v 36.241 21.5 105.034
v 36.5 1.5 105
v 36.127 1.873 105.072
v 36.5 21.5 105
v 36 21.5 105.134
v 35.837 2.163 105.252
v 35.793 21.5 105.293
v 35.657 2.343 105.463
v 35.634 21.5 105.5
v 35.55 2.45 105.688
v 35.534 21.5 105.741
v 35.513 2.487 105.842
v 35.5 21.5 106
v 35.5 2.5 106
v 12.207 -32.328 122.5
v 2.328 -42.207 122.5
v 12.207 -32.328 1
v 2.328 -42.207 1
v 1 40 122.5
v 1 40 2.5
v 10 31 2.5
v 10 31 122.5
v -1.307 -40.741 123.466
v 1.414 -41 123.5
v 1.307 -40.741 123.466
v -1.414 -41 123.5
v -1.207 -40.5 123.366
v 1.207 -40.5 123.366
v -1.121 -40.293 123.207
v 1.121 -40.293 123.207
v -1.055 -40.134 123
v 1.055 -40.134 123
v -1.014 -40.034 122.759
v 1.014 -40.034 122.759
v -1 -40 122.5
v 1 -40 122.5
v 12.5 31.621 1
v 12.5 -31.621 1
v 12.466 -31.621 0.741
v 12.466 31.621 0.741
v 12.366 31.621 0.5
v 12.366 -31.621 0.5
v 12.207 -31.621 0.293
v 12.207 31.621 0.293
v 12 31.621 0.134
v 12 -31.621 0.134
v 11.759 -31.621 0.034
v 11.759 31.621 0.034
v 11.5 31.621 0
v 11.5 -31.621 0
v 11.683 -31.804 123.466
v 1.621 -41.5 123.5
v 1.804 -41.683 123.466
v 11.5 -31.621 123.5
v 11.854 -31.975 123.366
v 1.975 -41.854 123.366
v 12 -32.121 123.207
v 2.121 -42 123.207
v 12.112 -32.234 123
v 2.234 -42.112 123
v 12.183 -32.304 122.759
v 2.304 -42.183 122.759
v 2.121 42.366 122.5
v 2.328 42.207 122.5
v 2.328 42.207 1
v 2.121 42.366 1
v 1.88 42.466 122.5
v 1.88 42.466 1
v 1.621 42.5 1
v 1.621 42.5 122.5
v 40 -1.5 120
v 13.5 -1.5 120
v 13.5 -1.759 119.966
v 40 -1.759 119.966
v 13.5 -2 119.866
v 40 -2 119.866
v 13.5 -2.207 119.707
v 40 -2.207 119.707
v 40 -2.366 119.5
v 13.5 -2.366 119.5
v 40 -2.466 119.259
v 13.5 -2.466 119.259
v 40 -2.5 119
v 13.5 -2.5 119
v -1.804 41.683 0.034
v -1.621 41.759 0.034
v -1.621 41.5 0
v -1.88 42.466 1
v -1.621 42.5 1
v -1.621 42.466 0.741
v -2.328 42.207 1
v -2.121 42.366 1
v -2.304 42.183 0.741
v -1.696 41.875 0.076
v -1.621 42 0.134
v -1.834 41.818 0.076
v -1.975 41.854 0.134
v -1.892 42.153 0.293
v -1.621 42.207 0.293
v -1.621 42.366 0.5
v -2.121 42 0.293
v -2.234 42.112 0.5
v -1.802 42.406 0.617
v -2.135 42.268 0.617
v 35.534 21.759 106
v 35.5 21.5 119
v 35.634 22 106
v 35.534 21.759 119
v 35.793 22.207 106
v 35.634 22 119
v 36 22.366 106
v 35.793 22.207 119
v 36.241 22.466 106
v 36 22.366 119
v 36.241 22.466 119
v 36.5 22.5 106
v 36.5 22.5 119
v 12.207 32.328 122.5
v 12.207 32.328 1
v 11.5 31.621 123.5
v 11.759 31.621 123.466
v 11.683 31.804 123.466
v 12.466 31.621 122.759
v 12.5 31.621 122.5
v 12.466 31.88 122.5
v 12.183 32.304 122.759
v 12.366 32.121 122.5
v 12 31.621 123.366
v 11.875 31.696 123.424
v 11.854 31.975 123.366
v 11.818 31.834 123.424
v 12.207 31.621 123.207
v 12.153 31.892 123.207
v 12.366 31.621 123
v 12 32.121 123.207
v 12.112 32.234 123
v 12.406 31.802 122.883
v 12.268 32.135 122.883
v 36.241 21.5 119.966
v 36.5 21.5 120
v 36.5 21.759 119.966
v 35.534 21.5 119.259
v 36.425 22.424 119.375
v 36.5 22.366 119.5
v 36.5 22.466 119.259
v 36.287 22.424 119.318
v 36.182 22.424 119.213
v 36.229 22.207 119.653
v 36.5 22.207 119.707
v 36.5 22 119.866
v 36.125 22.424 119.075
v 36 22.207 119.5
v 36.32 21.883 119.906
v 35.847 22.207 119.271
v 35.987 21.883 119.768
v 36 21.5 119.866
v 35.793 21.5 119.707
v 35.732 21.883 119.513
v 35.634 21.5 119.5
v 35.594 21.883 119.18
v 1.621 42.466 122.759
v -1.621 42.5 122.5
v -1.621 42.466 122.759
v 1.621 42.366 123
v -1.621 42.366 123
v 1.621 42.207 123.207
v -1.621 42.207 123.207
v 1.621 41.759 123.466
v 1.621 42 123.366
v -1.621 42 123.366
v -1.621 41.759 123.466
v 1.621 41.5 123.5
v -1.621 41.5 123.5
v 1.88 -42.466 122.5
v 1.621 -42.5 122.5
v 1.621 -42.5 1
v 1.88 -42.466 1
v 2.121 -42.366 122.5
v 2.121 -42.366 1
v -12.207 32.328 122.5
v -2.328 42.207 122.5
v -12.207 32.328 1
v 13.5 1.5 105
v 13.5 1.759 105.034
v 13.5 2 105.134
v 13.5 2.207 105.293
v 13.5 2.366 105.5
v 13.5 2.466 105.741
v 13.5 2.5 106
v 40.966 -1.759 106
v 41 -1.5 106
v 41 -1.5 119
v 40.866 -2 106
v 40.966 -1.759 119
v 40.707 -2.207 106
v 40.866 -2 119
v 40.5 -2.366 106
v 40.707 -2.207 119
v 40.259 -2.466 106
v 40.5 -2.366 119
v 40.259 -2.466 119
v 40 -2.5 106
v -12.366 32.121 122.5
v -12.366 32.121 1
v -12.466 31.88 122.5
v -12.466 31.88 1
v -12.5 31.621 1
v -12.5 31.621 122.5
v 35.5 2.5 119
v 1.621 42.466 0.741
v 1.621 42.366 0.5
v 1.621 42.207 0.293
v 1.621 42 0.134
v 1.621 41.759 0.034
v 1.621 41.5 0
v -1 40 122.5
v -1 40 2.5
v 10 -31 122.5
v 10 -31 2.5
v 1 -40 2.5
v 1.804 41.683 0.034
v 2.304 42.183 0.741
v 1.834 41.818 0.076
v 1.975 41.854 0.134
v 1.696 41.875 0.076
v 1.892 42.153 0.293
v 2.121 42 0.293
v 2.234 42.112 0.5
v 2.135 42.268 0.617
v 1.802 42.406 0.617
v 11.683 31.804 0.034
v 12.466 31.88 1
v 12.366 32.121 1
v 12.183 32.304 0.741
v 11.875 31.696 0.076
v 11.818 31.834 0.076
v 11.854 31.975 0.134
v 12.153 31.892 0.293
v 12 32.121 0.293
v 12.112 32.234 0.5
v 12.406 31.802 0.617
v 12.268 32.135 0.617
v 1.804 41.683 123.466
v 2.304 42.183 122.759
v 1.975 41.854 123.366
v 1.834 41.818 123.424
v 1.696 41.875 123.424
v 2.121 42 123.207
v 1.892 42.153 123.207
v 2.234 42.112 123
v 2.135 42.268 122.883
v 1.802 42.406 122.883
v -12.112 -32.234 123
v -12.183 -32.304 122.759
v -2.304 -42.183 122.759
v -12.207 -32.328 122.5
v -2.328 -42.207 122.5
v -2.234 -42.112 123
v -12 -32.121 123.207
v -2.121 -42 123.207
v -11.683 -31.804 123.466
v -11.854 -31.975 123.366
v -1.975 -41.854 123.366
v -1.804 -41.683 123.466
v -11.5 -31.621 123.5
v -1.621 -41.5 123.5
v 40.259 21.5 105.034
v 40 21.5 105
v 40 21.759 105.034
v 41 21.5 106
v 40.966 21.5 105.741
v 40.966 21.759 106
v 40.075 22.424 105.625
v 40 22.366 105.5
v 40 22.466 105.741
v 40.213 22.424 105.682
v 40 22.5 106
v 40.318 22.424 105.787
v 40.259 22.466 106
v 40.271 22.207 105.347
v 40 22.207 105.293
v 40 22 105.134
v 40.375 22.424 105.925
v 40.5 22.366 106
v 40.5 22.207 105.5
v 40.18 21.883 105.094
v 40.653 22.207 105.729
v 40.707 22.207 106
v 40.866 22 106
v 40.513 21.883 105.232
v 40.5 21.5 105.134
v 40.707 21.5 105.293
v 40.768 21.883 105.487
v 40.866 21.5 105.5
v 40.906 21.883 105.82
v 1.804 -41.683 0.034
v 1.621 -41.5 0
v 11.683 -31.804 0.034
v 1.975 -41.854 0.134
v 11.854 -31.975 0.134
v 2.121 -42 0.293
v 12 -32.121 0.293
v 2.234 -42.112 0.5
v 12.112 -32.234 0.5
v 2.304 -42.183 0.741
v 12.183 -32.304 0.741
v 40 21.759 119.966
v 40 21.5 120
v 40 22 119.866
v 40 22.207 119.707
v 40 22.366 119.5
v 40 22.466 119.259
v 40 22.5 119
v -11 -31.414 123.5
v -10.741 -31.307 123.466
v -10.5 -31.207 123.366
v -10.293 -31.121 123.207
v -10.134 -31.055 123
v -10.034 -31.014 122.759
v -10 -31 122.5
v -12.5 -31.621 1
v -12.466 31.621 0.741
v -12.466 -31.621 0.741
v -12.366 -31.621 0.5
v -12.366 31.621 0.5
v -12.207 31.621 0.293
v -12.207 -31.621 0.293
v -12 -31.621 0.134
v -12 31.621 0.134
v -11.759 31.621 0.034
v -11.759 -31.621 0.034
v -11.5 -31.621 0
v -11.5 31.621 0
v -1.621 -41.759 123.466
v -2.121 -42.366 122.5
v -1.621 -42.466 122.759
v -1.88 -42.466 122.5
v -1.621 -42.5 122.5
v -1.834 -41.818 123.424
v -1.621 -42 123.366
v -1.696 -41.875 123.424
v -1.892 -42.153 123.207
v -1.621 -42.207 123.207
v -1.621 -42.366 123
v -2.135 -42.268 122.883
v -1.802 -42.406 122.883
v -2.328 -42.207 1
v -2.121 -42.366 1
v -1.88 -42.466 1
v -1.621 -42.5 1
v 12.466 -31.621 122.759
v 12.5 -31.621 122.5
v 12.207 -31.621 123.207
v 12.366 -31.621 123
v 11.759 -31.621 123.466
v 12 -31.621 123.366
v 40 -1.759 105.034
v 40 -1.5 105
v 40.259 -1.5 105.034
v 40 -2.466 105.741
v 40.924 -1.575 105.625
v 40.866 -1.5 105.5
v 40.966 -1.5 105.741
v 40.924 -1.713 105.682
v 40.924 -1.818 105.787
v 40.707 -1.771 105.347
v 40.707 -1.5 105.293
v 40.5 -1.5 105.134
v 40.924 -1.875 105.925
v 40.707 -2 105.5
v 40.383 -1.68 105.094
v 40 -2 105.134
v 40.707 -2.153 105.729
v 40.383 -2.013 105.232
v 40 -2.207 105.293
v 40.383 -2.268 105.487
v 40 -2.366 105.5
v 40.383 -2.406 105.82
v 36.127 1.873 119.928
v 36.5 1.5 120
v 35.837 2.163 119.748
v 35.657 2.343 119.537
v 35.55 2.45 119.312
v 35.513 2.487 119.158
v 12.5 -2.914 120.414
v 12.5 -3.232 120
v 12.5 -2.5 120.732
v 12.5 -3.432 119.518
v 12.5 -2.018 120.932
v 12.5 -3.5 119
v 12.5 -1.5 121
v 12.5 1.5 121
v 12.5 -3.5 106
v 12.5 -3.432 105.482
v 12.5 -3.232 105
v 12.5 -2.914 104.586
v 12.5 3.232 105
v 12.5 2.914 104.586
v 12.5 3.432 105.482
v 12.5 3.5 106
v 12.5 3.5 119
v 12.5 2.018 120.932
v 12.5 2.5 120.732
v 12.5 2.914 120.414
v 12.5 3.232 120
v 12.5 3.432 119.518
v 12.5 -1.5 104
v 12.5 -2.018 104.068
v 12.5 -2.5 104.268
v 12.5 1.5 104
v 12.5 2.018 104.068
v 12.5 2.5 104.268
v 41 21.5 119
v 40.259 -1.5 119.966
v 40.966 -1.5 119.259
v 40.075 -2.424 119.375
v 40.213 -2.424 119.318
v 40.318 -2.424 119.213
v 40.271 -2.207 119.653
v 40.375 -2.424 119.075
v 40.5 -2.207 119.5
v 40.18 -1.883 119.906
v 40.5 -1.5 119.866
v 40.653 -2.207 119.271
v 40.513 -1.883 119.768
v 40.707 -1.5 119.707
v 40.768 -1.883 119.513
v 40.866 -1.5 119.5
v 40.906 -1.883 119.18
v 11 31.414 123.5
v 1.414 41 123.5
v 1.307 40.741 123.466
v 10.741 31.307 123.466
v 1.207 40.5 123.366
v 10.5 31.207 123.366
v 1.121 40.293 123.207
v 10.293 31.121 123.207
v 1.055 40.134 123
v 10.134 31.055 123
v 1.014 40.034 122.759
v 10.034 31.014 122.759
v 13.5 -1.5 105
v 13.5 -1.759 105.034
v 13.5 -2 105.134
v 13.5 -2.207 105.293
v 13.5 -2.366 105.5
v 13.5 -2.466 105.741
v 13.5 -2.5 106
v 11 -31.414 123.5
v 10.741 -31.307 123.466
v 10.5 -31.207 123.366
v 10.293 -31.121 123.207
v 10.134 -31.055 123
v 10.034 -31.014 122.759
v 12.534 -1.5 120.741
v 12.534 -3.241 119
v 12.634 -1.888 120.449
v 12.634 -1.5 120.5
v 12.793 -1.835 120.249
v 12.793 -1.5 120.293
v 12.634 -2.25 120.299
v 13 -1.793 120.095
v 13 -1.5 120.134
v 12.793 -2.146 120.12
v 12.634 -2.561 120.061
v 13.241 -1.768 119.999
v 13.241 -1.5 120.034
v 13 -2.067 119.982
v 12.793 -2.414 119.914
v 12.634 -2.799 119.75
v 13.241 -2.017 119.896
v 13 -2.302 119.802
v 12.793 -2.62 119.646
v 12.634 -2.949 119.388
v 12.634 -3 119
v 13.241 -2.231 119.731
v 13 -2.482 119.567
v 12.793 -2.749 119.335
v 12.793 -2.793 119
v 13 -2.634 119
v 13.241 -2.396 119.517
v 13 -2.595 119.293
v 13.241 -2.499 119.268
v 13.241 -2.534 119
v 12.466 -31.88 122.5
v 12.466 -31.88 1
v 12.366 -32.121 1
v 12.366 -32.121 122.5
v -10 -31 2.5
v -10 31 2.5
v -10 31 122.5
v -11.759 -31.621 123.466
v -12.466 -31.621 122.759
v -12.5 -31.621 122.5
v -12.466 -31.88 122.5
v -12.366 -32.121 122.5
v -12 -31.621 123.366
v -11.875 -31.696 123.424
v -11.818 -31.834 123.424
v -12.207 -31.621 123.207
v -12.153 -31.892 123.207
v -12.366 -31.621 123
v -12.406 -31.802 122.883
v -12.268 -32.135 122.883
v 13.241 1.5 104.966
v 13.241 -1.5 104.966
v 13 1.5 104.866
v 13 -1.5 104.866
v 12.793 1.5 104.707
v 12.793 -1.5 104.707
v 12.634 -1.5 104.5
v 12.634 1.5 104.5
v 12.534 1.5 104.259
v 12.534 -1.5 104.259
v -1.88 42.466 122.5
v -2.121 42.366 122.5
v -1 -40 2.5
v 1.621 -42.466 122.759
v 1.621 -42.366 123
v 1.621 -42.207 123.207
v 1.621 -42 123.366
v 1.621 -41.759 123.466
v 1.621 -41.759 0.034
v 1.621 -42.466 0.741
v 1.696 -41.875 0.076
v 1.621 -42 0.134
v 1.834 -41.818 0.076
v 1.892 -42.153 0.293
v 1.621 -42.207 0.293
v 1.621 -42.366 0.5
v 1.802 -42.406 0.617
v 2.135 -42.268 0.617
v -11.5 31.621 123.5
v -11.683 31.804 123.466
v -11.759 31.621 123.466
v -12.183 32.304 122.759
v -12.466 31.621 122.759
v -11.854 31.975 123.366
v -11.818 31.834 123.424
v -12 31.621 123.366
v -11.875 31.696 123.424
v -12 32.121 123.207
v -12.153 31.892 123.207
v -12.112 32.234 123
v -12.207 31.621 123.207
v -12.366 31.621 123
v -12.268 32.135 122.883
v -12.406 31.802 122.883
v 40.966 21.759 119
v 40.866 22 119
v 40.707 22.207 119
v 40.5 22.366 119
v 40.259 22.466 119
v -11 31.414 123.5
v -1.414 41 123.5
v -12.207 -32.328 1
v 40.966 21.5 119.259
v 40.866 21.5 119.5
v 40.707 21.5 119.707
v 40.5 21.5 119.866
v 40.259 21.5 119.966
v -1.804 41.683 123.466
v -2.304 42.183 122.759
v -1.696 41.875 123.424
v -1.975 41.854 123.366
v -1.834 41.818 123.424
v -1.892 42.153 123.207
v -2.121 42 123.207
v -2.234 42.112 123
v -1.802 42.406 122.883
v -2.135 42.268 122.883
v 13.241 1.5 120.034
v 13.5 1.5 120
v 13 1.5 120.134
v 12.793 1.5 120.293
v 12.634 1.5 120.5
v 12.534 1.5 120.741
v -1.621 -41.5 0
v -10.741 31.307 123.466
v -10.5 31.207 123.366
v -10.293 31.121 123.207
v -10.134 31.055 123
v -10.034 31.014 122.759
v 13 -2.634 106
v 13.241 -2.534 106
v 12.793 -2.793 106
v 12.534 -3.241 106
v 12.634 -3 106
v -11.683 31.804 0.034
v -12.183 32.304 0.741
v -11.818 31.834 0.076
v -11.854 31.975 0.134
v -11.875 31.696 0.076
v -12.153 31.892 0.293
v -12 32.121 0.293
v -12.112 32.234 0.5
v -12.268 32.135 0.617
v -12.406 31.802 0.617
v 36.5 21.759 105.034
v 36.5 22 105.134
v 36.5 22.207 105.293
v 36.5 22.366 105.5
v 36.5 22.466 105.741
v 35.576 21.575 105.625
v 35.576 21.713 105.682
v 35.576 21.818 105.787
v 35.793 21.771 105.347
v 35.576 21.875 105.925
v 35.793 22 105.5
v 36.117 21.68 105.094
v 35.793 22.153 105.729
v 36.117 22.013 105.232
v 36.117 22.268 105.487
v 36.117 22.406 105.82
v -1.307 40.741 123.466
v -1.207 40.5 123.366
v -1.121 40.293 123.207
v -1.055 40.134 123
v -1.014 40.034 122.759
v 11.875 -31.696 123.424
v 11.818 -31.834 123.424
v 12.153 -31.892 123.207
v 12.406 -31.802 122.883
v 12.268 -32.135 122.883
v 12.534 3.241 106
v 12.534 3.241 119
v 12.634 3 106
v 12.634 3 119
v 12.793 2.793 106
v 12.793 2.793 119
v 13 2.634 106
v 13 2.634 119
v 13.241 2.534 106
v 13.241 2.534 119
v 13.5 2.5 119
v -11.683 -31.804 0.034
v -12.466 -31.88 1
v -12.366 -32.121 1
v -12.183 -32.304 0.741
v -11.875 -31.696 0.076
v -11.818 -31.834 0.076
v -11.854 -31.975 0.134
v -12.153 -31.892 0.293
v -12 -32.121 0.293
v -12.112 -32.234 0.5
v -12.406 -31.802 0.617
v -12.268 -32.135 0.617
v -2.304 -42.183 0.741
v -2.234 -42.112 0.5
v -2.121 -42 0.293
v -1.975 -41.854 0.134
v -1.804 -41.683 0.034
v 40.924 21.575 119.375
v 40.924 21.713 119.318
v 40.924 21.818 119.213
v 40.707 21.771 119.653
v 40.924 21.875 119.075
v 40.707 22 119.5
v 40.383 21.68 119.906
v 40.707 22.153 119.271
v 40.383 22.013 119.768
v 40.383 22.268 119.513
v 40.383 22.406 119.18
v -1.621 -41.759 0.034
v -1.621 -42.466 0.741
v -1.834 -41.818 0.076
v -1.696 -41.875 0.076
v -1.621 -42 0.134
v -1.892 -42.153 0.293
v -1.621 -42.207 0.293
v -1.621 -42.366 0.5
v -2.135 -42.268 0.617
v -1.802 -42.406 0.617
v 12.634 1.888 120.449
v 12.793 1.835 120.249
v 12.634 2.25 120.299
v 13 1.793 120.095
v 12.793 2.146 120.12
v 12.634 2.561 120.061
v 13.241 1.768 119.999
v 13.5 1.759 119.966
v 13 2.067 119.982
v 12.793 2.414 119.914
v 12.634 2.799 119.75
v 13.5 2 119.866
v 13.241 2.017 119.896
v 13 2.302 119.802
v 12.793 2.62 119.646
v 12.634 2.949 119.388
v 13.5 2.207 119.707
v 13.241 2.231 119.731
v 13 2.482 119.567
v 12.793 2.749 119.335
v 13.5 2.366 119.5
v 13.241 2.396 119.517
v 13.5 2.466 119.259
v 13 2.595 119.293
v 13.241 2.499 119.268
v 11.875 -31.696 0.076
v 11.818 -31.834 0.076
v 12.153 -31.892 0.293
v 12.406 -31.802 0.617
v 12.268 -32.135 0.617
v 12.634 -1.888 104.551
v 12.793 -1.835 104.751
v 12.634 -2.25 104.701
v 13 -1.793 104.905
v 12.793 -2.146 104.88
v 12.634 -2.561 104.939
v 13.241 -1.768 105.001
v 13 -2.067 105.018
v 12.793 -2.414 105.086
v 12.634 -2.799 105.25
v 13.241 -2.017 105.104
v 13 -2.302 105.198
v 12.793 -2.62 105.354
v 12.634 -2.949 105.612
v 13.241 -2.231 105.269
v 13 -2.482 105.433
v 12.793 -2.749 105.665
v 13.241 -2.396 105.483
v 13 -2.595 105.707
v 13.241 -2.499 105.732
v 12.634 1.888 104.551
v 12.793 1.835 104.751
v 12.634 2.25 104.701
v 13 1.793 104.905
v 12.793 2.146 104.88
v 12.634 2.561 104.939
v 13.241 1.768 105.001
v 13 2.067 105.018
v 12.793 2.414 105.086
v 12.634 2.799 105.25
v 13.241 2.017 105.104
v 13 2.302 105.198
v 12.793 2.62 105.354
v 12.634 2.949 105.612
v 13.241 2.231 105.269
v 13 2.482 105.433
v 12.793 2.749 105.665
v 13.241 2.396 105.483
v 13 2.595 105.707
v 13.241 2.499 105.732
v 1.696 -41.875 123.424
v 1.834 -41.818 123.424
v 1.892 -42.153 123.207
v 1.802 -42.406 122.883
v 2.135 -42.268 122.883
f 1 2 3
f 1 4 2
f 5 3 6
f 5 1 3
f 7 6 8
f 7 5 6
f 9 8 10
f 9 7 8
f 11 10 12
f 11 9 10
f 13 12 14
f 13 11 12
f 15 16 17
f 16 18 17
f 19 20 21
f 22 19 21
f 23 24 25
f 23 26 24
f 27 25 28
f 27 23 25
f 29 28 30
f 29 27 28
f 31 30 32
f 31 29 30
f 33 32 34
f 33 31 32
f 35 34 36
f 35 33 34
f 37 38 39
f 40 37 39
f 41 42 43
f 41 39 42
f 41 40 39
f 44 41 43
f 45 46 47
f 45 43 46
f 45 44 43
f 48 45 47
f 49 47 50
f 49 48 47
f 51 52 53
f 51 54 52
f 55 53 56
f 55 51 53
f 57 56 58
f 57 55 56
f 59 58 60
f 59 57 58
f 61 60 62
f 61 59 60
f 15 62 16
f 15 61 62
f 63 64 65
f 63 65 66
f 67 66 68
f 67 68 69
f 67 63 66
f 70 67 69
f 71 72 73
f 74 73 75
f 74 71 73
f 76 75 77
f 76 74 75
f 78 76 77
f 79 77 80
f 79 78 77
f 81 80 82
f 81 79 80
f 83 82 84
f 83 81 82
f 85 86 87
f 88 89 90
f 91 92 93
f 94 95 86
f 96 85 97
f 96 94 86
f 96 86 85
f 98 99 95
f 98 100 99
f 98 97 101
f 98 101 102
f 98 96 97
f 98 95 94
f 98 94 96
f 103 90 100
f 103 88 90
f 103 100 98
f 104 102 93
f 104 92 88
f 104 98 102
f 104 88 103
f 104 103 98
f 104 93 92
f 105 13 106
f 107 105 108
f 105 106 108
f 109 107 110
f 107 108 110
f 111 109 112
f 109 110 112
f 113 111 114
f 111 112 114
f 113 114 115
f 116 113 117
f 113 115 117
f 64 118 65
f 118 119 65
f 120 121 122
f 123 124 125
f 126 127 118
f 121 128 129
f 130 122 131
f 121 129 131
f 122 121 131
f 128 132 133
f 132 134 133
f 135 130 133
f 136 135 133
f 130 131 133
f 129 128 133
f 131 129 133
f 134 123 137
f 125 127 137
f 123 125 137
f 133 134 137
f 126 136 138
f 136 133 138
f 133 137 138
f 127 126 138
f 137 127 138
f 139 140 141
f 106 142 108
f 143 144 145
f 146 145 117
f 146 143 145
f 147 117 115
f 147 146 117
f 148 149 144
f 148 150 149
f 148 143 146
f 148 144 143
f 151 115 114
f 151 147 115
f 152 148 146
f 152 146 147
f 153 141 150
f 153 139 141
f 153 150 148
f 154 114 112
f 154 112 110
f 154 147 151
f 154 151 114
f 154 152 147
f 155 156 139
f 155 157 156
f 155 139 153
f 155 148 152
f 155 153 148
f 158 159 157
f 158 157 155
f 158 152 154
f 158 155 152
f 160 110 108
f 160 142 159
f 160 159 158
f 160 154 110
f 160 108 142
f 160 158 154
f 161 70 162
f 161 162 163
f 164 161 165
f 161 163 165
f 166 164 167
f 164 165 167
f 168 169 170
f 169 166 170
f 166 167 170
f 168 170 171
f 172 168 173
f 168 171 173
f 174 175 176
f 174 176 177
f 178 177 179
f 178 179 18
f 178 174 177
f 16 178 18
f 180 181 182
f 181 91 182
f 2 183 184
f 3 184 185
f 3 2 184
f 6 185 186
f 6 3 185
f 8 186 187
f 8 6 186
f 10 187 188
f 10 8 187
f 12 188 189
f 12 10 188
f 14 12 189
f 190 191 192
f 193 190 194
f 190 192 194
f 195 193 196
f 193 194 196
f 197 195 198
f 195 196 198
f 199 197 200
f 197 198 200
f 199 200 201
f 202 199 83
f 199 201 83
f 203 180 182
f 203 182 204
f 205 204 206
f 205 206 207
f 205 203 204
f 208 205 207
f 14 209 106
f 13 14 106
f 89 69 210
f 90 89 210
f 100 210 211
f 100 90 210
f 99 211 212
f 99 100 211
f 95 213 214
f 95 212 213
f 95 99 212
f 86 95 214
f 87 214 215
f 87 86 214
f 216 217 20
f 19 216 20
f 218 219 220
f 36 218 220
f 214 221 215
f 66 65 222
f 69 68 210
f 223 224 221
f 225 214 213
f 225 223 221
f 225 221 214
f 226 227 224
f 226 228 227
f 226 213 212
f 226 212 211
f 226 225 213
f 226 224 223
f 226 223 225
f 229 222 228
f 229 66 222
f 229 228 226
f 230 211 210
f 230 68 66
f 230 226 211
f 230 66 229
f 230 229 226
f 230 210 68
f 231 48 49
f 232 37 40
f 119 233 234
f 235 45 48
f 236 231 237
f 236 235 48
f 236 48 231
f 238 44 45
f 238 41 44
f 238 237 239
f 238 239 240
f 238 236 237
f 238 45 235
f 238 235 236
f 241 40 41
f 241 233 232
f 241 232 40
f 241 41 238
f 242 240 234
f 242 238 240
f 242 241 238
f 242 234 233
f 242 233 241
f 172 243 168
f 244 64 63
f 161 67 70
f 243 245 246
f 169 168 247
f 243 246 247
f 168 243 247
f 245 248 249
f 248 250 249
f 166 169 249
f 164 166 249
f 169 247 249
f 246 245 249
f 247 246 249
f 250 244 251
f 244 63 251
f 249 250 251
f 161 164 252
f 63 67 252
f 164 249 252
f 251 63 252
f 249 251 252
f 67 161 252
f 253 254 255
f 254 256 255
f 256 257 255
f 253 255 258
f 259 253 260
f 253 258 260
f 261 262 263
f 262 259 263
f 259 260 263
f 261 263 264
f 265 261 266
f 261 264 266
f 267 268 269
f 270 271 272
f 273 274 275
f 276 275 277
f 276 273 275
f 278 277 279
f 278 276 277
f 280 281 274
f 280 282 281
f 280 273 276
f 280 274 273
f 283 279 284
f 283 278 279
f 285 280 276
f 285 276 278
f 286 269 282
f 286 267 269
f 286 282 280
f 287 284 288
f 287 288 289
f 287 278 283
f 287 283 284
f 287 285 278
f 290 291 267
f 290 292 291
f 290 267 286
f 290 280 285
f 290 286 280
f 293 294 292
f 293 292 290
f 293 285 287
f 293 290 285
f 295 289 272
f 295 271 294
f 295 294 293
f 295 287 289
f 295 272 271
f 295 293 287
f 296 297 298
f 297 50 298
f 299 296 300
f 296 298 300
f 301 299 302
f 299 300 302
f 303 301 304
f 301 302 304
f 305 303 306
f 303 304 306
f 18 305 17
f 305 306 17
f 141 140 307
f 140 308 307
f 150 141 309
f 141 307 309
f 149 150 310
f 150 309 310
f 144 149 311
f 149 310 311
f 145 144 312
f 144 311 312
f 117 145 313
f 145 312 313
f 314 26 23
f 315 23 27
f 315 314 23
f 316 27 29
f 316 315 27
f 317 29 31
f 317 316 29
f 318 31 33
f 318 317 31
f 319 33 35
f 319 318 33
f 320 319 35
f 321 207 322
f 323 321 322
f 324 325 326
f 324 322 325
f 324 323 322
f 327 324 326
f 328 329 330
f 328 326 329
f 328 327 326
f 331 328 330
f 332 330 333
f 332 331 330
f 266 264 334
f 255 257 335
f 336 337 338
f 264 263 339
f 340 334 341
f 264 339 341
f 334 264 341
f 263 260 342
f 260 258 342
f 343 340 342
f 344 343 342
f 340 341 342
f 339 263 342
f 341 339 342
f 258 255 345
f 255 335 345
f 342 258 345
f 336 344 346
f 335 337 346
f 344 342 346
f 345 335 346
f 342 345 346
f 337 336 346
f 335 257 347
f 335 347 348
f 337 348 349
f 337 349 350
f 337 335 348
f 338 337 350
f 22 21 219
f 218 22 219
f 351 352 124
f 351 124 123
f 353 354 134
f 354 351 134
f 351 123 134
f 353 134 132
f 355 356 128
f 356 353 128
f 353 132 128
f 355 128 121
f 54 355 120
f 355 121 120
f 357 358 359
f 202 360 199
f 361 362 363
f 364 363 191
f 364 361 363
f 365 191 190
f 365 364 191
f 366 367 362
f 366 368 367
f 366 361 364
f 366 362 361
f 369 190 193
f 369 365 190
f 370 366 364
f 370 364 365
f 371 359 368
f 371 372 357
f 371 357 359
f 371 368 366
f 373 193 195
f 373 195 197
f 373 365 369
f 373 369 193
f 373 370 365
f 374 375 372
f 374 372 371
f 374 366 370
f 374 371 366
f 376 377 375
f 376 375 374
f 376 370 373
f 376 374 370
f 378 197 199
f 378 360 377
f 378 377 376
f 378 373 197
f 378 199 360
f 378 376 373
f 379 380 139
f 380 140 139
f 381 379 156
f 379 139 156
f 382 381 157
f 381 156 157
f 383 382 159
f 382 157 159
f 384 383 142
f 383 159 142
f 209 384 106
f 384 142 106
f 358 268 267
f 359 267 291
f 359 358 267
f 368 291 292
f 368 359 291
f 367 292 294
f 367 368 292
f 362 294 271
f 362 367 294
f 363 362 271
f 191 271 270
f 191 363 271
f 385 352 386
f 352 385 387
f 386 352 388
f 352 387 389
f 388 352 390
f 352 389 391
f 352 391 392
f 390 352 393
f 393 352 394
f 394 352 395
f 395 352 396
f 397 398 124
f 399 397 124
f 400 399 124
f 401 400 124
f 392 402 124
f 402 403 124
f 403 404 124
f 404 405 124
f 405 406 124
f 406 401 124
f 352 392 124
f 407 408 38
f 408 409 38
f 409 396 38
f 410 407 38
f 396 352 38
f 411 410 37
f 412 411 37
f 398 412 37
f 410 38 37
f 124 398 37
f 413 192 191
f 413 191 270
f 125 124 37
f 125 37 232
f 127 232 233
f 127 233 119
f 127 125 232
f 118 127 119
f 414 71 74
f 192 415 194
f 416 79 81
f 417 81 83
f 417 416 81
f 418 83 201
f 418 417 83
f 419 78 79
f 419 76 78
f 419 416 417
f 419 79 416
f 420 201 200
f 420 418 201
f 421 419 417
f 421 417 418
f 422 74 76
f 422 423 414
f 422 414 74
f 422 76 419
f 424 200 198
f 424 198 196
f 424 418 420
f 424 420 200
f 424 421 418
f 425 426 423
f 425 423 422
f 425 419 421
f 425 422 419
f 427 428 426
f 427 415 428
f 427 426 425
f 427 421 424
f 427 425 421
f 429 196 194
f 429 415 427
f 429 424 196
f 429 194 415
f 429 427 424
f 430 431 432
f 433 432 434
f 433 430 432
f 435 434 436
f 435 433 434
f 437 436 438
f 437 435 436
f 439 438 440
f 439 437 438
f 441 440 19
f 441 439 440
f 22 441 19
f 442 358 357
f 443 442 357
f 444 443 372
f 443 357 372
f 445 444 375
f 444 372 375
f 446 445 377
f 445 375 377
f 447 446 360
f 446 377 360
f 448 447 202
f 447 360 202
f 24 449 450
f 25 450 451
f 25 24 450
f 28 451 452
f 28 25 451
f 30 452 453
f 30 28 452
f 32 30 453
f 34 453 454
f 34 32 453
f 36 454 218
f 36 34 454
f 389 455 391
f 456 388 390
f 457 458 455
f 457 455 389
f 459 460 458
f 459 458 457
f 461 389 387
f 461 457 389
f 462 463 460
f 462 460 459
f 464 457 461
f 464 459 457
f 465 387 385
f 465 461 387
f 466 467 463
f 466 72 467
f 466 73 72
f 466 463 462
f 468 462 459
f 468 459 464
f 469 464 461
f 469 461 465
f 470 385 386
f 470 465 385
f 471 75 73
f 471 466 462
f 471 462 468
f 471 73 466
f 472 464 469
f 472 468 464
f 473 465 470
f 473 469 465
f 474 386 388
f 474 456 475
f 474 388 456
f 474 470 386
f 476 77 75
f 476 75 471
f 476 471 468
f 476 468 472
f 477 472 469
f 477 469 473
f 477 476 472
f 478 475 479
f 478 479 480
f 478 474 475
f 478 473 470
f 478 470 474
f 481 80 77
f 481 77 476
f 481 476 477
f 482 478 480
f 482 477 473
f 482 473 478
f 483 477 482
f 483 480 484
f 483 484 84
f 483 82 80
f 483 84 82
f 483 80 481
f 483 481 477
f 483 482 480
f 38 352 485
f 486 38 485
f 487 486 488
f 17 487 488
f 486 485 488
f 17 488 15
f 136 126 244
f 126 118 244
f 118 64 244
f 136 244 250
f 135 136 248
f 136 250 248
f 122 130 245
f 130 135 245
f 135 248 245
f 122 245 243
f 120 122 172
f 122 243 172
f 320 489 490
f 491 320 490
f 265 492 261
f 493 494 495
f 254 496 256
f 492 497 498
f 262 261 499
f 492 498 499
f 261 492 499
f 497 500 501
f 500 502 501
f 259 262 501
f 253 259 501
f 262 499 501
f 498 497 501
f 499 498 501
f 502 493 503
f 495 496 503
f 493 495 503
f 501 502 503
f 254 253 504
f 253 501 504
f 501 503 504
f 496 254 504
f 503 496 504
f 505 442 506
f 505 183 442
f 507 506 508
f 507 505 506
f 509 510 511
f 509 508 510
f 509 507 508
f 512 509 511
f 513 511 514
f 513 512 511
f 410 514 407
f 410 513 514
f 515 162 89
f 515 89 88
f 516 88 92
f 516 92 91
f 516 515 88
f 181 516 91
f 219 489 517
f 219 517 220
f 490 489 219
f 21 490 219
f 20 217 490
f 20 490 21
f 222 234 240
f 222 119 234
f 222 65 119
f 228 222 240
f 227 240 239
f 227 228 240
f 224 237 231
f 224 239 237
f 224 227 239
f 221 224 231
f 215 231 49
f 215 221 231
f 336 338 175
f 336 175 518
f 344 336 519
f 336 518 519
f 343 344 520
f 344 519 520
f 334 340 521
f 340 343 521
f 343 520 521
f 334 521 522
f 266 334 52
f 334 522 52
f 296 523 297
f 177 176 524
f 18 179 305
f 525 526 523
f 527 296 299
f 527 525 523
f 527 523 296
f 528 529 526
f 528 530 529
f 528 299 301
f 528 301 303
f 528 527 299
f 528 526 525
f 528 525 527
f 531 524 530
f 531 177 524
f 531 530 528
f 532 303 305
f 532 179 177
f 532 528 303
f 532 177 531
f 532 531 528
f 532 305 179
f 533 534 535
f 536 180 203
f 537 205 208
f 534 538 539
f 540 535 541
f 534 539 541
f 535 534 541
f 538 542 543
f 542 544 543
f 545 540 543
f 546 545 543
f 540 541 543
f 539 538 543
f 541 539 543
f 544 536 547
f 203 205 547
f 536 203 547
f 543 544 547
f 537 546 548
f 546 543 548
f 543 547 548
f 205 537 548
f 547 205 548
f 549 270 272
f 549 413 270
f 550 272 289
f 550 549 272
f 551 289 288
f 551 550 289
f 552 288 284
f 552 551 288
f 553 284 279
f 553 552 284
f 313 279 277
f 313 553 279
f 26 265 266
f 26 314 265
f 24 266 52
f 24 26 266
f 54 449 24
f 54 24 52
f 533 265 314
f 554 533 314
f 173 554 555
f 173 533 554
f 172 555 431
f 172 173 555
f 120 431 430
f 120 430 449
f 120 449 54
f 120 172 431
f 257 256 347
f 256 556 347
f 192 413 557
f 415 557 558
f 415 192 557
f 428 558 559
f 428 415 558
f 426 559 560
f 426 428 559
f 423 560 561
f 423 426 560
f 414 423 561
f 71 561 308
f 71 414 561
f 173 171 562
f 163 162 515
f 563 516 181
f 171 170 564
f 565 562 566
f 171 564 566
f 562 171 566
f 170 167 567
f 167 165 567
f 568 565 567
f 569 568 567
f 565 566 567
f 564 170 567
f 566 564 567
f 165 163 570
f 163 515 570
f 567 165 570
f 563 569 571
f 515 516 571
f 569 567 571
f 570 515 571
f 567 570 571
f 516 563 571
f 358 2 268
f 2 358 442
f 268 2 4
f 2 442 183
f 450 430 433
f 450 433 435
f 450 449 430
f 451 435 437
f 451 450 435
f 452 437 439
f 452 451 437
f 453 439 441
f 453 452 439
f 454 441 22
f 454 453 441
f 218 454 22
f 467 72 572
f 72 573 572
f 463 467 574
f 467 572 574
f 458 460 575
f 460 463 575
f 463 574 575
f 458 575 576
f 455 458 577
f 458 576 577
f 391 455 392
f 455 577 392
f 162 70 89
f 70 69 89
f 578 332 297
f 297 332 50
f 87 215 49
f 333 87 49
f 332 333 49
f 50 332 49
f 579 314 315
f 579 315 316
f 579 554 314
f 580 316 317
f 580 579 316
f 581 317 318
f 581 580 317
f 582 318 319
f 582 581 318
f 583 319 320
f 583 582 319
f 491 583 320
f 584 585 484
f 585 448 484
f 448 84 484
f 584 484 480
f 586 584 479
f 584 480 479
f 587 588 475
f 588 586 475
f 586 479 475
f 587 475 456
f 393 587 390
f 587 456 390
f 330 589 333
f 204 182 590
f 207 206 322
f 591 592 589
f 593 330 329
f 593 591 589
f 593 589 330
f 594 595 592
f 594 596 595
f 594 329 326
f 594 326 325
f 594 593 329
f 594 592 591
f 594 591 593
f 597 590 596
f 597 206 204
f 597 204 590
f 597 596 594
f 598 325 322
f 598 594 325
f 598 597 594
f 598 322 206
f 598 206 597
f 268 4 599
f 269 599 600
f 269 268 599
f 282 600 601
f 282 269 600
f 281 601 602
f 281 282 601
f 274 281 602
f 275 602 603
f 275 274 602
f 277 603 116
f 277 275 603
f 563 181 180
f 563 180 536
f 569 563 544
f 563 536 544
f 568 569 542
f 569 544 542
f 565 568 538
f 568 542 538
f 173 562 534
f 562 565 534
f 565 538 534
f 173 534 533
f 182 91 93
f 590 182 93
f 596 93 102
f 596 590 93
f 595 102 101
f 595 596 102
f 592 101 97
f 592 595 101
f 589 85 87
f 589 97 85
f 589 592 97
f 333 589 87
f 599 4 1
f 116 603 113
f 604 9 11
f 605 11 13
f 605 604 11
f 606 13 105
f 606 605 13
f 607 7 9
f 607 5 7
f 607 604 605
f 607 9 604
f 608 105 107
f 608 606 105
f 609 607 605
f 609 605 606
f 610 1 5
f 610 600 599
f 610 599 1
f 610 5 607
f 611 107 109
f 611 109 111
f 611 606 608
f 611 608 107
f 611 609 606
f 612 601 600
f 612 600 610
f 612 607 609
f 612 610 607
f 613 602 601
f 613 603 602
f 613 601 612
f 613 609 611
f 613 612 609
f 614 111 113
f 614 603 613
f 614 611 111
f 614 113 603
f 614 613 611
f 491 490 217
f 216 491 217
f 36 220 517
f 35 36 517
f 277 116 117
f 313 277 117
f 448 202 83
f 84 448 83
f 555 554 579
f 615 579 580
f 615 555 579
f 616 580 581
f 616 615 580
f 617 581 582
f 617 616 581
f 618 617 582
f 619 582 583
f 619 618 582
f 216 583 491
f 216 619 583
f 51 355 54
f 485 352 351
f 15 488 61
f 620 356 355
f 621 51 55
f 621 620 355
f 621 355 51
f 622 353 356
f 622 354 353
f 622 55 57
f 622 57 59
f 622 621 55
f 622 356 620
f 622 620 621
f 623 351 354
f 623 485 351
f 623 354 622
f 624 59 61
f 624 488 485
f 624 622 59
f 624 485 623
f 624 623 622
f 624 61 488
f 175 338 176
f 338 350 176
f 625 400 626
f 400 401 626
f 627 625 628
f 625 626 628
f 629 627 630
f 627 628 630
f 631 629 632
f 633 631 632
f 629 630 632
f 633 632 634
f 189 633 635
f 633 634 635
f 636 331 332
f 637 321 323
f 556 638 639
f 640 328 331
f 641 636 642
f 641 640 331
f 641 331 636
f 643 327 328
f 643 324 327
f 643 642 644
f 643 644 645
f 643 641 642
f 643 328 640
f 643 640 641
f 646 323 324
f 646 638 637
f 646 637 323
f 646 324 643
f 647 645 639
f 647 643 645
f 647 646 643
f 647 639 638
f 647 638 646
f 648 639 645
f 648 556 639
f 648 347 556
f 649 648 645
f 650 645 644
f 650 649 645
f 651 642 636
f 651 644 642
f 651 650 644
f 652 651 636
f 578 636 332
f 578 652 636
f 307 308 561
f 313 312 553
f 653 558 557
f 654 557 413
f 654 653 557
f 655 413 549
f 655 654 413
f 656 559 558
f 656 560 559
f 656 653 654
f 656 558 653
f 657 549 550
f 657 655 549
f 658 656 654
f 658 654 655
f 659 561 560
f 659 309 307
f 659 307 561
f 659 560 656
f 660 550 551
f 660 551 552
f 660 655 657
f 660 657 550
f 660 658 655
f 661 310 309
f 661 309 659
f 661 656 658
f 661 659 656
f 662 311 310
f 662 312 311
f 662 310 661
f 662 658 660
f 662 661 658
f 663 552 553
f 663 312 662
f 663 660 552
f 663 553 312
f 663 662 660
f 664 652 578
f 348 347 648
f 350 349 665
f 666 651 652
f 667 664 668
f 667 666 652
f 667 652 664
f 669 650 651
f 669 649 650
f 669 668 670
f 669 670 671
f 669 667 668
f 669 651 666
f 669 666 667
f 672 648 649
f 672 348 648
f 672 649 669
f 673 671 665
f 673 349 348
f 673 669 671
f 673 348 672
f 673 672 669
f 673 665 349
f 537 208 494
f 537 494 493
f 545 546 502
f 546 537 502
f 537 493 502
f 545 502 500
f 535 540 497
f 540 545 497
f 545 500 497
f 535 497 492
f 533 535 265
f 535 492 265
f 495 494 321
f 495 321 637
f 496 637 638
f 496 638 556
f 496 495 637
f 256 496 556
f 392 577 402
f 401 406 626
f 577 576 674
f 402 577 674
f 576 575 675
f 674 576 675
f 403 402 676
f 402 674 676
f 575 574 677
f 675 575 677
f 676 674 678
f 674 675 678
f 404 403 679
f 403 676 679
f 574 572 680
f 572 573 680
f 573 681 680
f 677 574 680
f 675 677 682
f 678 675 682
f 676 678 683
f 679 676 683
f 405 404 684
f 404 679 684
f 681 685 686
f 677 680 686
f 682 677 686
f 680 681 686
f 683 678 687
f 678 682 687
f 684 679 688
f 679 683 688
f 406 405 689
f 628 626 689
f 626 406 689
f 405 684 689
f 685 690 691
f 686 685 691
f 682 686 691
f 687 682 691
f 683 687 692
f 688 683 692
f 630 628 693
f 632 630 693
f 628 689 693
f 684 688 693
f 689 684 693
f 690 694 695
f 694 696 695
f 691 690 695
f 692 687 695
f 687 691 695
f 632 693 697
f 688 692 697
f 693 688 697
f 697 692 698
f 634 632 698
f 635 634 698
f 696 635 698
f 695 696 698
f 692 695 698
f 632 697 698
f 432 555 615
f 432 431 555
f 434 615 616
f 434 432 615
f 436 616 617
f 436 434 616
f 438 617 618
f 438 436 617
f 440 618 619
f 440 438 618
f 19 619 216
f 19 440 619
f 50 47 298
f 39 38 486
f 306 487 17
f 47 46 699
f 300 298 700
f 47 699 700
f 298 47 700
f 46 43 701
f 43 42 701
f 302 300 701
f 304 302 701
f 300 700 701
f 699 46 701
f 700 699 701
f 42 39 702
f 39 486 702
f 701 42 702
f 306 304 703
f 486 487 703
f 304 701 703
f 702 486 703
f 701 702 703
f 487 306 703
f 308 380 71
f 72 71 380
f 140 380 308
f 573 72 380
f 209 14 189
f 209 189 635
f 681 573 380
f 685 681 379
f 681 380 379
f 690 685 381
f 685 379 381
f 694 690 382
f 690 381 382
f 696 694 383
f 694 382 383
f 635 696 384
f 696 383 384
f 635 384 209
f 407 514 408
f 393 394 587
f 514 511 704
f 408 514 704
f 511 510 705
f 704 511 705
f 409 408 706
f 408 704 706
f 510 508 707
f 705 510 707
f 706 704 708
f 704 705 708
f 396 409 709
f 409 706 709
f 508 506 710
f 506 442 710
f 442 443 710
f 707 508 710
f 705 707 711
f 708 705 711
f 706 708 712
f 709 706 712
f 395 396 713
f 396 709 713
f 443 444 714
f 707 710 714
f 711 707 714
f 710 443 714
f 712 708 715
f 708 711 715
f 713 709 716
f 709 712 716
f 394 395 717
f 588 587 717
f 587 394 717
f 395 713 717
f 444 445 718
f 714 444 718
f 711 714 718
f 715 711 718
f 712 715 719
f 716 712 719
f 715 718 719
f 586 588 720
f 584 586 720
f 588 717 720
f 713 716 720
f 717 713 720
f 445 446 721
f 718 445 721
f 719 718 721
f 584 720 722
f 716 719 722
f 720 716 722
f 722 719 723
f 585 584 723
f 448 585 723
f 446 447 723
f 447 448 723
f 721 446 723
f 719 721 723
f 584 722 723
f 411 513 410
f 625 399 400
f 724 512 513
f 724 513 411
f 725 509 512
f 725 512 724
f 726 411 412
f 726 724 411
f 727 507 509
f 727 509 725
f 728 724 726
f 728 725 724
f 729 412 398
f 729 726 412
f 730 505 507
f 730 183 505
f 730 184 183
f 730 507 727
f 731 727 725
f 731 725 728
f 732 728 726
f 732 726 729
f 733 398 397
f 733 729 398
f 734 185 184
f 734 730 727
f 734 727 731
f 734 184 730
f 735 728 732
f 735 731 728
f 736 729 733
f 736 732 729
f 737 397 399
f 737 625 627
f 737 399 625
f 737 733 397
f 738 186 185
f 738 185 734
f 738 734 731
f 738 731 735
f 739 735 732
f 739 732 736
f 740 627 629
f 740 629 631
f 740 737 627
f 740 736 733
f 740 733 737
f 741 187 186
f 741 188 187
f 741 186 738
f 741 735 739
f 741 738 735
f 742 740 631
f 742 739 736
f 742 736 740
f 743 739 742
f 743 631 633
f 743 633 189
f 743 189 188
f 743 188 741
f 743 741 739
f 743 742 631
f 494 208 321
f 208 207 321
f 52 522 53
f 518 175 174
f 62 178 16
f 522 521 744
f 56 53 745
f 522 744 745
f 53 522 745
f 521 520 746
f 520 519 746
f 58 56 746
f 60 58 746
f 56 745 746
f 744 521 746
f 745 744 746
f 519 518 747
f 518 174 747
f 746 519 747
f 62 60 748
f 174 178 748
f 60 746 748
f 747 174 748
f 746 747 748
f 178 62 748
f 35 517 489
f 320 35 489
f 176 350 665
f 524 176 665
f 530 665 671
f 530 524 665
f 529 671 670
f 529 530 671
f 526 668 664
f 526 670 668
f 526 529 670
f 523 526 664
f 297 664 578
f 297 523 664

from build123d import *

# Parameters (mm, degrees)
F1_DEPTH = 2.5
F2_DEPTH = 123.5
F3_W     = 5
F3_H     = 15
F4_DEPTH = 28.5
F5_START = 23
F3_W_2   = 20
F5_DEPTH = 5.5
F6_R     = 1


with BuildPart() as f1:
    # F0 (on Top) → F1 (new body)
    with BuildSketch(Plane.XY):
        Polygon((10, 31), (1, 40), (-1, 40), (-10, 31), (-10, -31), (-1, -40), (1, -40), (10, -31), align=None)
    extrude(amount=F1_DEPTH)

    # F0 (on Top) → F2 (join)
    with BuildSketch(Plane.XY):
        Polygon((12.500000447, -32.0355340911), (12.500000447, 32.0355340911), (2.0355340911, 42.500000447), (-2.0355340911, 42.500000447), (-12.500000447, 32.0355340911), (-12.500000447, -32.0355340911), (-2.0355340911, -42.500000447), (2.0355340911, -42.500000447), align=None)
        Polygon((-1, 40), (1, 40), (10, 31), (10, -31), (1, -40), (-1, -40), (-10, -31), (-10, 31), align=None, mode=Mode.SUBTRACT)
    extrude(amount=F2_DEPTH)

    # F3 (on face) → F4 (join)
    with BuildSketch(Plane.YZ.offset(12.500000447)):
        with Locations((-4.47e-07, 112.5)):
            Rectangle(F3_W, F3_H)
    extrude(amount=F4_DEPTH)

    # F3 (on face) → F5 (join)
    with BuildSketch(Plane.YZ.offset(12.500000447).offset(F5_START)):
        with Locations((12.499999553, 112.5)):
            Rectangle(F3_W_2, F3_H)
    extrude(amount=F5_DEPTH)

    # F6
    f6_edges = [f1.edges().sort_by_distance(p)[0] for p in [
        (12.5, 0, 123.5),
        (7.267767, 37.267767, 123.5),
        (0, 42.5, 123.5),
        (-7.267767, 37.267767, 123.5),
        (-12.5, 0, 123.5),
        (-7.267767, -37.267767, 123.5),
        (0, -42.5, 123.5),
        (7.267767, -37.267767, 123.5),
        (0, 40, 123.5),
        (5.5, 35.5, 123.5),
        (10, 0, 123.5),
        (5.5, -35.5, 123.5),
        (0, -40, 123.5),
        (-5.5, -35.5, 123.5),
        (-10, 0, 123.5),
        (-5.5, 35.5, 123.5),
        (24, 2.5, 120),
        (35.5, 12.5, 120),
        (38.25, 22.5, 120),
        (41, 10, 120),
        (26.75, -2.5, 120),
        (12.5, 0, 120),
        (26.75, -2.5, 105),
        (41, 10, 105),
        (38.25, 22.5, 105),
        (35.5, 12.5, 105),
        (24, 2.5, 105),
        (12.5, 0, 105),
        (12.5, 0, 0),
        (7.267767, 37.267767, 0),
        (0, 42.5, 0),
        (-7.267767, 37.267767, 0),
        (-12.5, 0, 0),
        (-7.267767, -37.267767, 0),
        (0, -42.5, 0),
        (7.267767, -37.267767, 0),
        (-2.035534, 42.5, 61.75),
        (-12.5, 32.035534, 61.75),
        (-12.5, -32.035534, 61.75),
        (-2.035534, -42.5, 61.75),
        (2.035534, 42.5, 61.75),
        (12.5, 32.035534, 61.75),
        (12.5, -32.035534, 61.75),
        (2.035534, -42.5, 61.75),
        (35.5, 22.5, 112.5),
        (41, 22.5, 112.5),
        (41, -2.5, 112.5),
        (12.5, 2.5, 112.5),
        (12.5, -2.5, 112.5),
    ]]
    fillet(f6_edges, radius=F6_R)


solid = f1.part
